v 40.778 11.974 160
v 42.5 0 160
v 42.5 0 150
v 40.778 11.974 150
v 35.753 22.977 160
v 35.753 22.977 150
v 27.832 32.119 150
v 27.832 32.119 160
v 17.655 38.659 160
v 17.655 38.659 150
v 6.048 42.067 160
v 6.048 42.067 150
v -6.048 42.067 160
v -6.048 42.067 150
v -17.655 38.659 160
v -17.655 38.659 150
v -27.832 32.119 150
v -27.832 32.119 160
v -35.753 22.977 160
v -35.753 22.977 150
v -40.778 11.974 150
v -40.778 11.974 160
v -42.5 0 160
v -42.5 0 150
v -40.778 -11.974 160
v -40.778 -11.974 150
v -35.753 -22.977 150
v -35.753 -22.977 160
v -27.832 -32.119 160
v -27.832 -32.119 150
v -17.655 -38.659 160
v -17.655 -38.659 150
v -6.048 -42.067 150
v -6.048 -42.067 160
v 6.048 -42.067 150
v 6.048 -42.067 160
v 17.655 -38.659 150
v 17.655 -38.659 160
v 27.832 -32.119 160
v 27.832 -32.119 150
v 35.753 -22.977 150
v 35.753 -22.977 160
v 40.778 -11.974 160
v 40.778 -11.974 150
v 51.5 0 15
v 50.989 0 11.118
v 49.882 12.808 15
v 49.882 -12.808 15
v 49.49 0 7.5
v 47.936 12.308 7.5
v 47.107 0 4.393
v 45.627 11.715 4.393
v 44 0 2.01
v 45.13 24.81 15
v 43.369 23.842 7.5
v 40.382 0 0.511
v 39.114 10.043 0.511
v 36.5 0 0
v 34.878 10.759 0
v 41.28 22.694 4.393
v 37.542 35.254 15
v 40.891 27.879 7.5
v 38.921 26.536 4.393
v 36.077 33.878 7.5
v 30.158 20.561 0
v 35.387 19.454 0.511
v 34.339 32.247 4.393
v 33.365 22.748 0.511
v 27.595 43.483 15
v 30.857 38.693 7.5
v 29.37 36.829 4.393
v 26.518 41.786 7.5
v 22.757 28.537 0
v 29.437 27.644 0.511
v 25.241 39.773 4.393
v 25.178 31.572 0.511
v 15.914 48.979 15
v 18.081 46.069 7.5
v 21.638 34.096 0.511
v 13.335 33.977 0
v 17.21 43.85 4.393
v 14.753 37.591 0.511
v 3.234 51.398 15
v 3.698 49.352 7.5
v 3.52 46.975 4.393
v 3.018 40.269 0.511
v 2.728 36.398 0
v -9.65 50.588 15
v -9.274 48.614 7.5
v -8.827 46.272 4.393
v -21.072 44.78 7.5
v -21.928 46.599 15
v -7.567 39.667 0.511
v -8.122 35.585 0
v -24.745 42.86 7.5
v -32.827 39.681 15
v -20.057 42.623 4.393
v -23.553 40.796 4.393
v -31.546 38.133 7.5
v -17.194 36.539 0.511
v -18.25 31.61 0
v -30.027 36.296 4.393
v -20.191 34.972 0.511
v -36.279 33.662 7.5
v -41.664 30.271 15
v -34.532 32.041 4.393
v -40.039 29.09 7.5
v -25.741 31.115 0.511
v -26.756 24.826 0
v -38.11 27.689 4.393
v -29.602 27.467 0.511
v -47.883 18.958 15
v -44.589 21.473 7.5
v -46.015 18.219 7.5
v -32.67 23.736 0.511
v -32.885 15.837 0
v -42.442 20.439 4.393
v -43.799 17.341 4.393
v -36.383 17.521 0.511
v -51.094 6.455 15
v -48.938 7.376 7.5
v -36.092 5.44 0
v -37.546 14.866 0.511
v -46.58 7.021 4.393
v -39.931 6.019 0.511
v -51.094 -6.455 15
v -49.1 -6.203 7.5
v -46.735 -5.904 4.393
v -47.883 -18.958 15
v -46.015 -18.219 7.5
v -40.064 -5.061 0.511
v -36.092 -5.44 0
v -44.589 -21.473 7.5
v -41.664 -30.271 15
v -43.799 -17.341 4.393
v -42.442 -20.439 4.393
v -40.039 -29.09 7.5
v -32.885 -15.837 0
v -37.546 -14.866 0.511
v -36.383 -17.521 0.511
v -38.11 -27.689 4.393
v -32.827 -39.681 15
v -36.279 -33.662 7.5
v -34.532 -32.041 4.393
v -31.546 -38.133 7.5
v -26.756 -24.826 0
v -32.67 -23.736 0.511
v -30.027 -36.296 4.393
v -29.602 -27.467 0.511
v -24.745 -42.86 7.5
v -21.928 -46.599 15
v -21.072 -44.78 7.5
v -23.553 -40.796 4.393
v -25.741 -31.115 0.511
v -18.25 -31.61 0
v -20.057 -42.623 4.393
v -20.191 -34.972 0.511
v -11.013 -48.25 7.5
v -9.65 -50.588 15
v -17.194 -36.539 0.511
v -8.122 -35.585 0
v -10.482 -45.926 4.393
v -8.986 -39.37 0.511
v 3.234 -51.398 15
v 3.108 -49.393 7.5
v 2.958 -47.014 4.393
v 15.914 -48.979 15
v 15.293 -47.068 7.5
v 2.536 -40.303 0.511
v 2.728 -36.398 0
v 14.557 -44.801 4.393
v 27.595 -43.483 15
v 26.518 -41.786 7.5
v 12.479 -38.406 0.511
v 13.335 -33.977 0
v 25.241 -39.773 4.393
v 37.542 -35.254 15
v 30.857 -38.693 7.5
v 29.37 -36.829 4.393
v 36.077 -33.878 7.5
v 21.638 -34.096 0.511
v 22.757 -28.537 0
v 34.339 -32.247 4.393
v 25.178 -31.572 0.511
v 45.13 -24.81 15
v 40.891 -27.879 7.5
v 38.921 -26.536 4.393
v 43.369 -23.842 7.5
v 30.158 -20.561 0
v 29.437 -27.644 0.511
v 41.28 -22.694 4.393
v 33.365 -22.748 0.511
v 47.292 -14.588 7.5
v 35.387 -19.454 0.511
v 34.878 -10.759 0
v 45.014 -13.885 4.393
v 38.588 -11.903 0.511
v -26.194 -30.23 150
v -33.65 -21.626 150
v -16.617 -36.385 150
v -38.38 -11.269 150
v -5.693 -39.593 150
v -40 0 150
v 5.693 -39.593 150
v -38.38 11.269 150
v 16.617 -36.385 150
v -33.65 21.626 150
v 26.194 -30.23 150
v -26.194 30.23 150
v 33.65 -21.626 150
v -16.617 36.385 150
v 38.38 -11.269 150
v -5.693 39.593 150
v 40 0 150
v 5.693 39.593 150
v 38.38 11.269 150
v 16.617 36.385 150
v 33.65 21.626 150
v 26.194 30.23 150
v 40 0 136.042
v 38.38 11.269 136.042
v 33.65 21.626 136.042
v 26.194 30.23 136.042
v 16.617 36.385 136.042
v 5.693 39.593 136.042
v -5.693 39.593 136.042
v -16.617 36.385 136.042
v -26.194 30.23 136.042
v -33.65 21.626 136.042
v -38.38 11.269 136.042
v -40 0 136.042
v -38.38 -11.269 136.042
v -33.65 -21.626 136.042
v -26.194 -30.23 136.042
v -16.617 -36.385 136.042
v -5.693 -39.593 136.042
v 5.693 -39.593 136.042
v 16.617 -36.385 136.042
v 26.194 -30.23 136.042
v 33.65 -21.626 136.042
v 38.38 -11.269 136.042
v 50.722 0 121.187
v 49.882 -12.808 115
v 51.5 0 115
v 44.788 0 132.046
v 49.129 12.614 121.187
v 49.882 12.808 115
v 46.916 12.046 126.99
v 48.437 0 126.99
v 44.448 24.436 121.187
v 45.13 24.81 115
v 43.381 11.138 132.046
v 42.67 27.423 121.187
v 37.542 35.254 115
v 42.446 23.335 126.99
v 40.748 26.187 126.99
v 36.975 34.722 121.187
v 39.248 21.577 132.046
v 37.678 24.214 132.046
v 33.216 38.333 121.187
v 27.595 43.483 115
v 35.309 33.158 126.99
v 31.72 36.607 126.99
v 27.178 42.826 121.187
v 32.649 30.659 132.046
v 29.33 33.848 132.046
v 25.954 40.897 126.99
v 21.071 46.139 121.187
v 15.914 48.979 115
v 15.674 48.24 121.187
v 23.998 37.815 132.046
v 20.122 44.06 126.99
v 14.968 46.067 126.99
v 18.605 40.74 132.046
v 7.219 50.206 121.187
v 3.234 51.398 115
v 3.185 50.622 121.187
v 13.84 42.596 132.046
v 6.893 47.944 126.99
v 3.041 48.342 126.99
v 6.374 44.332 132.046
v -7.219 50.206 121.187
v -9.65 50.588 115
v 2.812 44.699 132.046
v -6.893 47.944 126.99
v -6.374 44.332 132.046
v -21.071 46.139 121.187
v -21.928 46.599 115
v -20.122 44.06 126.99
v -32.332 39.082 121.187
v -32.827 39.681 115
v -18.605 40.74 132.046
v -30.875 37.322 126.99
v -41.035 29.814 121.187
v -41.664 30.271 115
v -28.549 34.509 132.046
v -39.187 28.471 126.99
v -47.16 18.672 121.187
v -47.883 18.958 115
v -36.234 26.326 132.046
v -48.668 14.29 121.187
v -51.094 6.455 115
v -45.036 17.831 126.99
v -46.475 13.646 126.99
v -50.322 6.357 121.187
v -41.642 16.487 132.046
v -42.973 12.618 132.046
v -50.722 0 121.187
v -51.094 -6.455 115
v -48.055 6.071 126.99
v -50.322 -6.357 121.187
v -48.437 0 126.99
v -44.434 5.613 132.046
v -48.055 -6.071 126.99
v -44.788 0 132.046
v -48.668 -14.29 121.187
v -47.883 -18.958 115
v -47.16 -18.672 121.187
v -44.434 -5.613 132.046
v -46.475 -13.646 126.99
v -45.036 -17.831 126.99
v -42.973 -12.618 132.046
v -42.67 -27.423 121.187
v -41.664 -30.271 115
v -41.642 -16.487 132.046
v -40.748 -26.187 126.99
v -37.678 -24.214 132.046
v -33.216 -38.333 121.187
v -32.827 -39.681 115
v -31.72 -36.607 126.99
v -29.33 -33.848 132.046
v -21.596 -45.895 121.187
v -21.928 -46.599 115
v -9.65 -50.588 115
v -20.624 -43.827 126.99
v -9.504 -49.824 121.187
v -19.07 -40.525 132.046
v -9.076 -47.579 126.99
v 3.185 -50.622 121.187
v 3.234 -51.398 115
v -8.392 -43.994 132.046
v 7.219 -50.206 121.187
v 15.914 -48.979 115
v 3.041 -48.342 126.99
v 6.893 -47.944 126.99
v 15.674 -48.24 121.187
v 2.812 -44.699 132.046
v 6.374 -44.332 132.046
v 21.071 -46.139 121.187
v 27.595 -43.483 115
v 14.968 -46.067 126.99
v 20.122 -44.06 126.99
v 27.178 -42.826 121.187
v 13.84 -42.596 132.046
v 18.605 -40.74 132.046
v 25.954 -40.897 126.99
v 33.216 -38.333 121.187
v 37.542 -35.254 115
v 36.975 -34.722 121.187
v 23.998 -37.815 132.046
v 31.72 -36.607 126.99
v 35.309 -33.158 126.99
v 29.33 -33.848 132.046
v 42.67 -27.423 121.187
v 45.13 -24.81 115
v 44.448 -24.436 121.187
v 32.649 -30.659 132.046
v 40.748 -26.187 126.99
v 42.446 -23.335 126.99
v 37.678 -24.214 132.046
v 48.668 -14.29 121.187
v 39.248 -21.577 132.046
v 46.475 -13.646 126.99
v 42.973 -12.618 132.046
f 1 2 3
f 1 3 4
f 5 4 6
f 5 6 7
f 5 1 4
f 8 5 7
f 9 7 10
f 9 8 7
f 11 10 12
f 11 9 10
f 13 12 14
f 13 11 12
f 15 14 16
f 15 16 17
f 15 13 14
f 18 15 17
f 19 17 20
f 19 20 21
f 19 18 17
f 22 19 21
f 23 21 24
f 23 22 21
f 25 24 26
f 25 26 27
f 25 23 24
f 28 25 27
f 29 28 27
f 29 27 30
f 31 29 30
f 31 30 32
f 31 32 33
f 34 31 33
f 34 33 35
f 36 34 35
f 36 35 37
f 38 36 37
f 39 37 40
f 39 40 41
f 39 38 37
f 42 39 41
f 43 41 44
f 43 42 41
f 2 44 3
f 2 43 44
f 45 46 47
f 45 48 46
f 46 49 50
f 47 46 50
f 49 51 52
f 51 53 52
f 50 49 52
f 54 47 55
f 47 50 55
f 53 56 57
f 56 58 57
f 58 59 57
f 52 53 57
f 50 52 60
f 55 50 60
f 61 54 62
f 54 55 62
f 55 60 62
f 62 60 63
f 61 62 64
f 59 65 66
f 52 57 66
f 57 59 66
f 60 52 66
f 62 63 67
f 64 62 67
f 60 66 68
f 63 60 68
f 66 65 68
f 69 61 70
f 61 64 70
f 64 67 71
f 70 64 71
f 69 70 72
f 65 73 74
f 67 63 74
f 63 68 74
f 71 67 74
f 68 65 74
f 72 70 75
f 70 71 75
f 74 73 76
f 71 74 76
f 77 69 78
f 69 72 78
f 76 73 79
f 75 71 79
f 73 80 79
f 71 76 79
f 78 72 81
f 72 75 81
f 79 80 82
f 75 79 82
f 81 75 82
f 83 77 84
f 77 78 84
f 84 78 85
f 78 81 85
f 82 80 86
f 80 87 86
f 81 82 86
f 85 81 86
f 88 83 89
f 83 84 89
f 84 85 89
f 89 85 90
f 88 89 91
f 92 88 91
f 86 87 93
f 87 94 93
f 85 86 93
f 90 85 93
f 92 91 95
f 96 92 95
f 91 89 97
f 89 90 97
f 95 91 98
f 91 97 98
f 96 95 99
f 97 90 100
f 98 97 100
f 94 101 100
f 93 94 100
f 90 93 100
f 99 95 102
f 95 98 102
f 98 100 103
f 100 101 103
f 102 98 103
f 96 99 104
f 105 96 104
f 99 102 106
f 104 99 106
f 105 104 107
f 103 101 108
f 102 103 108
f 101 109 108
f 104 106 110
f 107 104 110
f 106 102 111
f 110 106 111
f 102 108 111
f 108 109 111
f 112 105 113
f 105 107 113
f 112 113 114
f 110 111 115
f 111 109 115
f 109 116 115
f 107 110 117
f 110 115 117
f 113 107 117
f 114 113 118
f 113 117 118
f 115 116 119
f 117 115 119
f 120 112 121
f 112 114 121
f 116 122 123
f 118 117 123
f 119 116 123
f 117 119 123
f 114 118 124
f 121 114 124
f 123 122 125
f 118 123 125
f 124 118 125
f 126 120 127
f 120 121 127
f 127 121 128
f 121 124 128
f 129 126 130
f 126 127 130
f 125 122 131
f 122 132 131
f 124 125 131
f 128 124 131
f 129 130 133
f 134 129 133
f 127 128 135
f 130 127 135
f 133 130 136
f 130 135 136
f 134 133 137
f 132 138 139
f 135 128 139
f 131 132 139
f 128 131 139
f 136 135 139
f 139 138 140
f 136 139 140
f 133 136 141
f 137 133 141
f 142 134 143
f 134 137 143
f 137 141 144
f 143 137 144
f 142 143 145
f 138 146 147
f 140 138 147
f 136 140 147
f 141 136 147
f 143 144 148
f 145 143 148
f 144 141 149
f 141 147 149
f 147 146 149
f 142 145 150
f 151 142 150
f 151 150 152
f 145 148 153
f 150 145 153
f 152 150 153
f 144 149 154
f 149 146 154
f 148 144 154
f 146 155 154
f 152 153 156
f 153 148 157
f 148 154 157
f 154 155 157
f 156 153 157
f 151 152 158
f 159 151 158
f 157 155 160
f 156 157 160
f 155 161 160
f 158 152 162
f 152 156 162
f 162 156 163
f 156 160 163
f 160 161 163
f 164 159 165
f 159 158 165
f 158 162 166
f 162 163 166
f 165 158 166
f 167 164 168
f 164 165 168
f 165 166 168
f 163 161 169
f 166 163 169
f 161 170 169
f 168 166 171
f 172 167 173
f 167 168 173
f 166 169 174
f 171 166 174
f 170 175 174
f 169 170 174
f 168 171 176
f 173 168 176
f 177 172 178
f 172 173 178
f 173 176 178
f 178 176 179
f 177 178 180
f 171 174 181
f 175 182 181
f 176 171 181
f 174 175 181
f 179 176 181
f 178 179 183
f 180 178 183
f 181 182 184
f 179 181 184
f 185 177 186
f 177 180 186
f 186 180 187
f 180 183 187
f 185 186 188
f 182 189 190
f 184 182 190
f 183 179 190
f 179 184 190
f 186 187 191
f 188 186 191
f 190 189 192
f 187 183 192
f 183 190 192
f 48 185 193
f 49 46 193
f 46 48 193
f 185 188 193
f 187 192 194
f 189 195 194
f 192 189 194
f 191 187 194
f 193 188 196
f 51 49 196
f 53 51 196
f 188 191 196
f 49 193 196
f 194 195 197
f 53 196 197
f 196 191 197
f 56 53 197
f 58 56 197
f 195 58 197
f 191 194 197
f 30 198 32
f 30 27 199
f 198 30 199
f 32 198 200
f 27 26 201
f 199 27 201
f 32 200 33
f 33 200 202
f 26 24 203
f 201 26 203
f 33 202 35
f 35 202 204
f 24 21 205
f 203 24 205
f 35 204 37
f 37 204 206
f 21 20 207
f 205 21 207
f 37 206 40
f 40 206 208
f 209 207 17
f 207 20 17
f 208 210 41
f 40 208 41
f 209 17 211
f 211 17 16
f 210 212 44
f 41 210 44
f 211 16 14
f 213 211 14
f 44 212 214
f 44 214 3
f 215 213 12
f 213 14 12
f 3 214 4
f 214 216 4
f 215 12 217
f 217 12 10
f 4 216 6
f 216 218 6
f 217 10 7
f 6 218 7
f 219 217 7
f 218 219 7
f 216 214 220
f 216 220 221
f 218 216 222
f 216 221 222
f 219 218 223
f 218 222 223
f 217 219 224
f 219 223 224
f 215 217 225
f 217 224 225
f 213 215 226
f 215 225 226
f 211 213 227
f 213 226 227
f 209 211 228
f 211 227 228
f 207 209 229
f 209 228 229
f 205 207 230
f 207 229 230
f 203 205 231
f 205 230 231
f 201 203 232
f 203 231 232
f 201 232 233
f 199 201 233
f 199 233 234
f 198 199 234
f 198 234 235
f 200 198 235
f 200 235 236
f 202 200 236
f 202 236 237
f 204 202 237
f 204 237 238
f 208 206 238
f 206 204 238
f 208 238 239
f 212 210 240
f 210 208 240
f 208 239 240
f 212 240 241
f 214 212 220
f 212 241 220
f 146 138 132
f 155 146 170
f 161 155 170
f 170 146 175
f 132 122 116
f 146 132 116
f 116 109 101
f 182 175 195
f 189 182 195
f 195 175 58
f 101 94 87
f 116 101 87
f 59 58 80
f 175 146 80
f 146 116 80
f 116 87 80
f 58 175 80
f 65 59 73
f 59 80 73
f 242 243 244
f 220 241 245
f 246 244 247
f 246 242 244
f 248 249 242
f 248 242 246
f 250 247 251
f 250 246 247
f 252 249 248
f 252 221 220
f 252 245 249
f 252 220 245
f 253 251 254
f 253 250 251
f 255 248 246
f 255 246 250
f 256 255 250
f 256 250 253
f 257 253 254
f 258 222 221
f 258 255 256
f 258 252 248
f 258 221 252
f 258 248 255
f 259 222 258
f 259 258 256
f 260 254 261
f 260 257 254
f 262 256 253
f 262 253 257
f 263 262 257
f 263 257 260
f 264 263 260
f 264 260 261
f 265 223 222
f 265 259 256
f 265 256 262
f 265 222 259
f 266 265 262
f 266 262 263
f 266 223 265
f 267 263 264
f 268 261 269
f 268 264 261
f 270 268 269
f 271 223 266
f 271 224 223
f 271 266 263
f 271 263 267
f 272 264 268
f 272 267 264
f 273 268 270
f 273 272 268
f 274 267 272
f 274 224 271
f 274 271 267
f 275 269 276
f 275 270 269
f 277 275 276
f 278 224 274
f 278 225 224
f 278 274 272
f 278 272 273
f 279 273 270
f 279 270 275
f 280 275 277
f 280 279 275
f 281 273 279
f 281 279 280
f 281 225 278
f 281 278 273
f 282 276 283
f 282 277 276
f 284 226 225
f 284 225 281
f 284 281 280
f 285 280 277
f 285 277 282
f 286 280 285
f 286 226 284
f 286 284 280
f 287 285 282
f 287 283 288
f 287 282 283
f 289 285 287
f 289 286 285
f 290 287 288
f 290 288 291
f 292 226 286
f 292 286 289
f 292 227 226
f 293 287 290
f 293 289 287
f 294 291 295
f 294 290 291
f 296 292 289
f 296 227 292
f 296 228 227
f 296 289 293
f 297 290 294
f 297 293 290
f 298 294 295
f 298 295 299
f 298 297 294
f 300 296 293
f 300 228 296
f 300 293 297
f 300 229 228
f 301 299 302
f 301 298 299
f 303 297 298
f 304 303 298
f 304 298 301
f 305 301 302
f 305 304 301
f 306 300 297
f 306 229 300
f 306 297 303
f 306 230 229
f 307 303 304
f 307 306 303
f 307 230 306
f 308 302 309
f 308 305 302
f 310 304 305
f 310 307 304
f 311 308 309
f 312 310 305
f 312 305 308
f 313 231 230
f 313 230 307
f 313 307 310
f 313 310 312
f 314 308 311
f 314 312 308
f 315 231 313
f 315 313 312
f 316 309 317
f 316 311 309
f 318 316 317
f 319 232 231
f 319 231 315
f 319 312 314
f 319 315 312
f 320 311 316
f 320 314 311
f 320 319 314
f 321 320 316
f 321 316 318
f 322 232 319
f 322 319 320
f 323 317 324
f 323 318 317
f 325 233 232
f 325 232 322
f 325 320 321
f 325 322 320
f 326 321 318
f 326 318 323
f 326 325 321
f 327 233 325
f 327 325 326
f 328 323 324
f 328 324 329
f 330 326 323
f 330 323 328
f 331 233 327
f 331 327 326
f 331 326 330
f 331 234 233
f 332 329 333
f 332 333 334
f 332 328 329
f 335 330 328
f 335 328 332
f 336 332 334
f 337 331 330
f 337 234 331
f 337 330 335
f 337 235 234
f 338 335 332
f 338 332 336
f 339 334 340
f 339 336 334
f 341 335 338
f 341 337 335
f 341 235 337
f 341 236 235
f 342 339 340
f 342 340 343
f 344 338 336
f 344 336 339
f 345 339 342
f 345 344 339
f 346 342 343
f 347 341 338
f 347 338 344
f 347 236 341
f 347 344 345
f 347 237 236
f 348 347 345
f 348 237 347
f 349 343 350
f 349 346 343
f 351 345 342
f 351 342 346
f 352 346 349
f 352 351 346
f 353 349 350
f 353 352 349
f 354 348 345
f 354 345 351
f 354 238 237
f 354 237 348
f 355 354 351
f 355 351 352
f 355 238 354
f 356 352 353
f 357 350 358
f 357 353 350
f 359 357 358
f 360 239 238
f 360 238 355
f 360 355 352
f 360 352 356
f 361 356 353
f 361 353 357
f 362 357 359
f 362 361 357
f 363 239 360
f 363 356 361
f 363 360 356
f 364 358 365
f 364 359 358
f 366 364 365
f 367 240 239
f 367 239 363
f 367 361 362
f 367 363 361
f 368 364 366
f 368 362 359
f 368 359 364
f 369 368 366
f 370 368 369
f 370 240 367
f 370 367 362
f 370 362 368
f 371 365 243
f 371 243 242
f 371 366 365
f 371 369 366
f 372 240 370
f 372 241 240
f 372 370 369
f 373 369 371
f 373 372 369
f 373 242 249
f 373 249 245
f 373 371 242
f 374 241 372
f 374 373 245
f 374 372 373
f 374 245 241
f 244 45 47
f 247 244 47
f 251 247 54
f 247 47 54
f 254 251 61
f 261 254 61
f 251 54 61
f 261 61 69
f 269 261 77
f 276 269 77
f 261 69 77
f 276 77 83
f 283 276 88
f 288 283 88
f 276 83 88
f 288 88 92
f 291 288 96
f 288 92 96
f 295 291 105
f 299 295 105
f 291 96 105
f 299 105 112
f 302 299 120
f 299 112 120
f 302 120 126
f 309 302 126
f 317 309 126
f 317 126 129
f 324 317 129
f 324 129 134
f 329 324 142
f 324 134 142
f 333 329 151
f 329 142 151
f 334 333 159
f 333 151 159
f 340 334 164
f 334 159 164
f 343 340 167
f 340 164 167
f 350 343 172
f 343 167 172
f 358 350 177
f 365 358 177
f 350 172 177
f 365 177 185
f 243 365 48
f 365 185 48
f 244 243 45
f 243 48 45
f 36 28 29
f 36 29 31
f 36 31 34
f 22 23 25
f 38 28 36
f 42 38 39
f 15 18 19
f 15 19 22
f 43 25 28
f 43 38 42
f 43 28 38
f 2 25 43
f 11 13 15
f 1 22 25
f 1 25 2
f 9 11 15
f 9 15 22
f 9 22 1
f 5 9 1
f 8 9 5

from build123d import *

# Parameters (mm, degrees)
SKETCH_R     = 51.5
PAD_DEPTH    = 140
FILLET_R     = 25
FILLET001_R  = 15
SKETCH001_R  = 40
PAD001_DEPTH = 30
SKETCH002_R  = 42.5
PAD002_DEPTH = 10


with BuildPart() as part:
    # Sketch → Pad (new body)
    with BuildSketch(Plane.XY):
        Circle(SKETCH_R)
    extrude(amount=PAD_DEPTH)

    # Fillet
    fillet_edges = [part.edges().sort_by_distance(p)[0] for p in [
        (-51.5, 0, 140),
    ]]
    fillet(fillet_edges, radius=FILLET_R)

    # Fillet001
    fillet001_edges = [part.edges().sort_by_distance(p)[0] for p in [
        (-51.5, 0, 0),
    ]]
    fillet(fillet001_edges, radius=FILLET001_R)

    # Sketch001 (on Face5 of Fillet001) → Pad001 (join)
    with BuildSketch(Plane.XY.offset(130)):
        Circle(SKETCH001_R)
    extrude(amount=PAD001_DEPTH)

    # Sketch002 (on Face6 of Pad001) → Pad002 (join)
    with BuildSketch(Plane.XY.offset(160)):
        Circle(SKETCH002_R)
    extrude(amount=-PAD002_DEPTH)


solid = part.part
